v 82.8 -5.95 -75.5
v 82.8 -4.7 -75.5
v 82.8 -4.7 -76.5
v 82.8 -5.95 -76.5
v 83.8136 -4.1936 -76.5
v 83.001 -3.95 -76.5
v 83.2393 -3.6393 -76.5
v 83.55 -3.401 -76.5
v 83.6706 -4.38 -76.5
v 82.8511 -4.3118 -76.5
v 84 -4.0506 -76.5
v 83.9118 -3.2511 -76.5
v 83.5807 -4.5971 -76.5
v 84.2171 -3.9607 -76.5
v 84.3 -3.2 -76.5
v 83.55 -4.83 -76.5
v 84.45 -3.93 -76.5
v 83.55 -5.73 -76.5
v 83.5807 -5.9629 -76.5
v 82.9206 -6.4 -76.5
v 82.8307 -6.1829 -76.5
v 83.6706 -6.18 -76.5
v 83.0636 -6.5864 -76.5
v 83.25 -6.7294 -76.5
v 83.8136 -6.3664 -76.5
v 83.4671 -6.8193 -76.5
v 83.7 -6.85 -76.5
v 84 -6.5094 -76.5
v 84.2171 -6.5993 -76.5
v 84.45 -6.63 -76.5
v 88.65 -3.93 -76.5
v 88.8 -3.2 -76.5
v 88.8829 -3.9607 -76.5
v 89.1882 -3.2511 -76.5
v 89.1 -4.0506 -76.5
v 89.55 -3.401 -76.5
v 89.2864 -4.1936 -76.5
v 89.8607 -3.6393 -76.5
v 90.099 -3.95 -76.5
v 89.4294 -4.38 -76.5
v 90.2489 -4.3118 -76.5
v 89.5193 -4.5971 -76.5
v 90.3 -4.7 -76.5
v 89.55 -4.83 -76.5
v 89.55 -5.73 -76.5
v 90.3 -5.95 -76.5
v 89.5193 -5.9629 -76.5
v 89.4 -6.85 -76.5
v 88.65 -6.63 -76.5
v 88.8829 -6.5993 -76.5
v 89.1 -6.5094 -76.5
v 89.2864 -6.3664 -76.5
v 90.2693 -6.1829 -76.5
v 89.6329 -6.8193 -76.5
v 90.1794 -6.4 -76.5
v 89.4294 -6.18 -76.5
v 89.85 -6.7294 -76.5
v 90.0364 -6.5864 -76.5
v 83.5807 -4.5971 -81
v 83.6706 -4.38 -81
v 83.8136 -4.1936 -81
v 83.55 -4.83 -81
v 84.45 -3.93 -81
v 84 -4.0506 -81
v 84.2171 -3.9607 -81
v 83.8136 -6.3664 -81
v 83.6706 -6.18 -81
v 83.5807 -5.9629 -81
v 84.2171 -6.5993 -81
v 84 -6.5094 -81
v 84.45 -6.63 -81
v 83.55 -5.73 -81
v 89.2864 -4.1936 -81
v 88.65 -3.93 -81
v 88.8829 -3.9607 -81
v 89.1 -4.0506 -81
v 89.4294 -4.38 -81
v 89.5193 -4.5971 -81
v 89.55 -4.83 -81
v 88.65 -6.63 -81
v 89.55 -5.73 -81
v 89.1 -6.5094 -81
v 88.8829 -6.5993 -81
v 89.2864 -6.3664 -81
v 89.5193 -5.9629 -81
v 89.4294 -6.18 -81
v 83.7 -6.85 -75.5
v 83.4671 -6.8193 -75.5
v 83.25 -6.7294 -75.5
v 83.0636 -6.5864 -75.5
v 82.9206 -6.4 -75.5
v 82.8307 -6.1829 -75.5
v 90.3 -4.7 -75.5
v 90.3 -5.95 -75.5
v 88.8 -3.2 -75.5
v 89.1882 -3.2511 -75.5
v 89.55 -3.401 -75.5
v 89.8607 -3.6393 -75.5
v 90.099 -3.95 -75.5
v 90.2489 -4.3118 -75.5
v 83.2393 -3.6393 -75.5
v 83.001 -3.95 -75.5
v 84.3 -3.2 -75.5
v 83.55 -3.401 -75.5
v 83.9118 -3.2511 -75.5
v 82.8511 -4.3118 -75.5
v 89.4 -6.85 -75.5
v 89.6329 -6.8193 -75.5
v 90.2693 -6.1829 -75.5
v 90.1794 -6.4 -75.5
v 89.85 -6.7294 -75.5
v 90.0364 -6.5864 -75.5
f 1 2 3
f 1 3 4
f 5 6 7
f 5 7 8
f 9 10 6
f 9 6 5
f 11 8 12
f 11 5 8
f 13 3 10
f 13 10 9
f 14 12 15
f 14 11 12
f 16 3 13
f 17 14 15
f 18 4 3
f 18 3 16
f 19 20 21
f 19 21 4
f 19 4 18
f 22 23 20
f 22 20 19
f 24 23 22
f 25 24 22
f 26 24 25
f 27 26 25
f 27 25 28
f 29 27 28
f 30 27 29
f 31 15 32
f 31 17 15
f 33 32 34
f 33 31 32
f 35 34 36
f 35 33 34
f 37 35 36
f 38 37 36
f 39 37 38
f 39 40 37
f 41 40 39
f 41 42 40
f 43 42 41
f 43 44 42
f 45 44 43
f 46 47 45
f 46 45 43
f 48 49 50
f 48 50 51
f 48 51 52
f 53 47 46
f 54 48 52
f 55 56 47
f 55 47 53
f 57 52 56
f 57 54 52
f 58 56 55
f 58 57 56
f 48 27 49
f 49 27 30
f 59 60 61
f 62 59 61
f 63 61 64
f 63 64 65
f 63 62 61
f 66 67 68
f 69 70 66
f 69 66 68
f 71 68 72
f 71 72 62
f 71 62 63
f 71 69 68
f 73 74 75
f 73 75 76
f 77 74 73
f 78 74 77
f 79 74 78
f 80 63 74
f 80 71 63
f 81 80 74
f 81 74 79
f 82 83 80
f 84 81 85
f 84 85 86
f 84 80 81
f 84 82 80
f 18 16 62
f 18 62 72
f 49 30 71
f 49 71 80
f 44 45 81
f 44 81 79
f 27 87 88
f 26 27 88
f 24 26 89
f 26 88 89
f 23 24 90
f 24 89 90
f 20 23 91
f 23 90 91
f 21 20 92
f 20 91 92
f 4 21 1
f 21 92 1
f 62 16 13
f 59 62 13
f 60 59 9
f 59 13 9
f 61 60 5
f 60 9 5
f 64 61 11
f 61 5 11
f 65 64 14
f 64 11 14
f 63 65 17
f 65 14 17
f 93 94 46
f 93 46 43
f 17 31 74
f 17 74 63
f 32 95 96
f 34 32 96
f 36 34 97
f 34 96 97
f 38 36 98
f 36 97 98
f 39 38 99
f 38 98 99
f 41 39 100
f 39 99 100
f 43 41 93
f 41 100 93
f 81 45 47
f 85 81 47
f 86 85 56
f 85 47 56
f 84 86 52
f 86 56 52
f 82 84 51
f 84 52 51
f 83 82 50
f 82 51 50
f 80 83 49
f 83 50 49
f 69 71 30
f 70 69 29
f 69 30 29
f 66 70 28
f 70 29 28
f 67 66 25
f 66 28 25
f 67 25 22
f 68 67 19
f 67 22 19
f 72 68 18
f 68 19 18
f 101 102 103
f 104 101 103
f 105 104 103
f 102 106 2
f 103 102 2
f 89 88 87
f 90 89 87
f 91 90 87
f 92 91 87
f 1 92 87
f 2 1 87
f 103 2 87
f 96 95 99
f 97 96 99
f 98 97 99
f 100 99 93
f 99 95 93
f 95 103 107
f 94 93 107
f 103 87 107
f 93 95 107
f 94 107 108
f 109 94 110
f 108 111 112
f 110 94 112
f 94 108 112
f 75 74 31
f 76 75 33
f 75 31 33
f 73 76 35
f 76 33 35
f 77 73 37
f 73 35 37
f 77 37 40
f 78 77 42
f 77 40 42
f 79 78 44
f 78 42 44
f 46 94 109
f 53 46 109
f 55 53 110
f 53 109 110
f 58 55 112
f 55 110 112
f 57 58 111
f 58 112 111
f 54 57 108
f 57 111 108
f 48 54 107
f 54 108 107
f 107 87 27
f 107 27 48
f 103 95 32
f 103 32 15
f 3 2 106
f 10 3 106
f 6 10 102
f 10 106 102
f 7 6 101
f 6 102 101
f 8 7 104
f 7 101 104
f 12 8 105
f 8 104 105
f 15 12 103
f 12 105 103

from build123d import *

# Parameters (mm, degrees)
EXTRUDE230_DEPTH          = 1
EXTRUDE229_DEPTH          = 5
FUSION223_PLACEMENT_ANGLE = 90


with BuildPart() as extrude230:
    # Sketch232 → Extrude230 (new body)
    with BuildSketch(Plane.XZ):
        with BuildLine():
            ThreePointArc((11.7, 16.35), (11.063604, 16.086396), (10.8, 15.45))
            Line((10.8, 14.2), (10.8, 15.45))
            ThreePointArc((10.8, 14.2), (11.23934, 13.13934), (12.3, 12.7))
            Line((16.8, 12.7), (12.3, 12.7))
            ThreePointArc((16.8, 12.7), (17.86066, 13.13934), (18.3, 14.2))
            Line((18.3, 15.45), (18.3, 14.2))
            ThreePointArc((18.3, 15.45), (18.036396, 16.086396), (17.4, 16.35))
            Line((11.7, 16.35), (17.4, 16.35))
        make_face()
    extrude(amount=EXTRUDE230_DEPTH)


with BuildPart() as extrude230_1:
    # Extrude230 placement: moved
    add(extrude230.part.moved(Location((0, 2.5, 0))))


with BuildPart() as button005:
    # Sketch231 → Extrude229 (new body)
    with BuildSketch(Plane.XZ):
        with BuildLine():
            ThreePointArc((12.75, 16.23), (12.113604, 15.966396), (11.85, 15.33))
            Line((11.85, 14.43), (11.85, 15.33))
            ThreePointArc((11.85, 14.43), (12.113604, 13.793604), (12.75, 13.53))
            Line((16.95, 13.53), (12.75, 13.53))
            ThreePointArc((16.95, 13.53), (17.586396, 13.793604), (17.85, 14.43))
            Line((17.85, 15.33), (17.85, 14.43))
            ThreePointArc((17.85, 15.33), (17.586396, 15.966396), (16.95, 16.23))
            Line((12.75, 16.23), (16.95, 16.23))
        make_face()
    extrude(amount=EXTRUDE229_DEPTH)


with BuildPart() as button005_1:
    # Extrude229 placement: moved
    add(button005.part.moved(Location((-0.3, 2, -0.1))))

    # Fusion223: union Extrude230
    add(extrude230_1.part)


with BuildPart() as button005_2:
    # Fusion223 placement: moved
    add(button005_1.part.moved(Location((72, 9.5, -78))).rotate(Axis((72, 9.5, -78), (1, 0, 0)), FUSION223_PLACEMENT_ANGLE))


solid = button005_2.part
